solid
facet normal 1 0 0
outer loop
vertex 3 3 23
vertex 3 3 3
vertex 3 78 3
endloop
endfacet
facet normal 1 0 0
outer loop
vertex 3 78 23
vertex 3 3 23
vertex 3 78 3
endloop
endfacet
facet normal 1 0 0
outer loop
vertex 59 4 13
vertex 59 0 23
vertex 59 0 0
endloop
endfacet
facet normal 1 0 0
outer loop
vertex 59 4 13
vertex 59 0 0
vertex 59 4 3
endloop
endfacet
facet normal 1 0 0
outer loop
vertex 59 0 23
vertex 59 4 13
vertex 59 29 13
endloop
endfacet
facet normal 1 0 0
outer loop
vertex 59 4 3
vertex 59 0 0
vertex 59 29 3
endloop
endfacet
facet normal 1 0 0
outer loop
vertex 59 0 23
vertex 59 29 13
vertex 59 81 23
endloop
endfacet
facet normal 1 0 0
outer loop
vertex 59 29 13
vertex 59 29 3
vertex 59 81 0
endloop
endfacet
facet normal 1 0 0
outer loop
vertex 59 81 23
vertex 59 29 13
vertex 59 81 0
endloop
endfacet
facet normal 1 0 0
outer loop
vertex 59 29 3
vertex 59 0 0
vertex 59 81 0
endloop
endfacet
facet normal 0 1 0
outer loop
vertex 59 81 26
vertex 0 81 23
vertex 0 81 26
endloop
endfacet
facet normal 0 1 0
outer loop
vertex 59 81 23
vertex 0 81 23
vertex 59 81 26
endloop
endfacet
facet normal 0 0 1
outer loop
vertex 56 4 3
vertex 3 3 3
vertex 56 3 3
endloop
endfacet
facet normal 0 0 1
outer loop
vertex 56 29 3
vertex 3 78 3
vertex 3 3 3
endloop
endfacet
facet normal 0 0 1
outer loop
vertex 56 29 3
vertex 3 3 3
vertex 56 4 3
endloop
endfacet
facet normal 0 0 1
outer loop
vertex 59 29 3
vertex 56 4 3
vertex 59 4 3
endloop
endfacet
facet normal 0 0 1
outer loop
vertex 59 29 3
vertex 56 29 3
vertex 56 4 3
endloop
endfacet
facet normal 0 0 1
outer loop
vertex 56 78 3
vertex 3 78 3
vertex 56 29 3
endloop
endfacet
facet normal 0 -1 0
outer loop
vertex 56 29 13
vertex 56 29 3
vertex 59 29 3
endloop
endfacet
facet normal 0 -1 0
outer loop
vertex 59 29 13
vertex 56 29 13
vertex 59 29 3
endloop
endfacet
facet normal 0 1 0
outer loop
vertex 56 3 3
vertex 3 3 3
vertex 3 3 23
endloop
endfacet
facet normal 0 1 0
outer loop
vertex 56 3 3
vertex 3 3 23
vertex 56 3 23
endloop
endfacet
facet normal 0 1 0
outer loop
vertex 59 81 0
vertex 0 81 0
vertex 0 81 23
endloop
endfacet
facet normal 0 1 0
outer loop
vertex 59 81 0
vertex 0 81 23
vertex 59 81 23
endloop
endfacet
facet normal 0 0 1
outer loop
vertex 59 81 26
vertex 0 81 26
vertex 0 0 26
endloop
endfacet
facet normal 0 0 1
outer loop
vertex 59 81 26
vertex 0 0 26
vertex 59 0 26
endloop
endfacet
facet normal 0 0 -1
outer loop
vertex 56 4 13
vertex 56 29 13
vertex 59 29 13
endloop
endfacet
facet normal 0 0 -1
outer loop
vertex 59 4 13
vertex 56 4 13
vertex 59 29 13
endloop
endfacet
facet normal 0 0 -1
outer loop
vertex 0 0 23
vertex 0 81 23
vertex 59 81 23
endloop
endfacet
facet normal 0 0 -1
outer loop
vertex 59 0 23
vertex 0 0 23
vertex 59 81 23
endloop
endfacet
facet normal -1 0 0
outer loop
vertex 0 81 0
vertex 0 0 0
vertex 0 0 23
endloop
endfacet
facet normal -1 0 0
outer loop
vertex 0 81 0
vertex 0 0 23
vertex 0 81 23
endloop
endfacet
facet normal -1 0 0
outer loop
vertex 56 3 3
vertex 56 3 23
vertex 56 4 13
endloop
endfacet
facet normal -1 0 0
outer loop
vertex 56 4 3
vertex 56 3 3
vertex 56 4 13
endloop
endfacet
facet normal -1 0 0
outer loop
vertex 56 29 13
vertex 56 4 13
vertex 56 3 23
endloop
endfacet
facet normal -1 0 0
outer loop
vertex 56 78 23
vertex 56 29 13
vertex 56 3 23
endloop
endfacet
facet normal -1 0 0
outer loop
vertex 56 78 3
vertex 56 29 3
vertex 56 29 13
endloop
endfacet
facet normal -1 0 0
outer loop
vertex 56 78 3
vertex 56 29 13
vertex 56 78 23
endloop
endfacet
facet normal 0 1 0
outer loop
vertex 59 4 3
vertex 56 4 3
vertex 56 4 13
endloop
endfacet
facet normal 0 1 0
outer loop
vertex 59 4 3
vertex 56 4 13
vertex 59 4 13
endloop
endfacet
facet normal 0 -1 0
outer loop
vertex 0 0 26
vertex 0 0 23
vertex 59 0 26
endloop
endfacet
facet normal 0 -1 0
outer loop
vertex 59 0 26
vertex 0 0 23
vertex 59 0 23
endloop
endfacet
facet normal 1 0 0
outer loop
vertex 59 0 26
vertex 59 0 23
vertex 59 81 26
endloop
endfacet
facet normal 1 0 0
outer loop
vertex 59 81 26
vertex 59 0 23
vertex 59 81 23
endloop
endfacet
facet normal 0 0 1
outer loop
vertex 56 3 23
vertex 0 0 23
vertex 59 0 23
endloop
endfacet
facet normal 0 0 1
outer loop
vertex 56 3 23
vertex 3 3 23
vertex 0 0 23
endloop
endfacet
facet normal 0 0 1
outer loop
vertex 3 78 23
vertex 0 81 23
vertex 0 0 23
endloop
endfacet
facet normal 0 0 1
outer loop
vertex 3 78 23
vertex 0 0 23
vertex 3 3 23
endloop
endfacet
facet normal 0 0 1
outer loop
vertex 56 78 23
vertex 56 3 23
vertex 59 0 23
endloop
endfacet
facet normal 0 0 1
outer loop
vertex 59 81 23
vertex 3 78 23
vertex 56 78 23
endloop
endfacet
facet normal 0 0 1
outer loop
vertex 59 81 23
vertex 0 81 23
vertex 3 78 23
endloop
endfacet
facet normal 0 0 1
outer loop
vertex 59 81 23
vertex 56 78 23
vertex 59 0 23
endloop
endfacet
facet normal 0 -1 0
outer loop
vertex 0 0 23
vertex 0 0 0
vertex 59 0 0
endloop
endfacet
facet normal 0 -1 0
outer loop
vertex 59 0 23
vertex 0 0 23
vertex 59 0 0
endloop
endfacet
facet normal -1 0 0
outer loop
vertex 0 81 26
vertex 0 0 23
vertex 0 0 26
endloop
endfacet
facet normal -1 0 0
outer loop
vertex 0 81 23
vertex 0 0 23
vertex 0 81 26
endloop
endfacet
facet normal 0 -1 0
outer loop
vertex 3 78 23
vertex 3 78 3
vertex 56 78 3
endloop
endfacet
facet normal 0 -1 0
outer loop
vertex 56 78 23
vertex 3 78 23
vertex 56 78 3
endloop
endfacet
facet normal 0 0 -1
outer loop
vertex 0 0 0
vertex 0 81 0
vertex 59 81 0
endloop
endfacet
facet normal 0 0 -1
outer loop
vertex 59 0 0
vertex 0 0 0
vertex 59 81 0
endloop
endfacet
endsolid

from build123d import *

# Parameters (mm, degrees)
BOX003_W     = 3
BOX003_H     = 25
BOX003_DEPTH = 10
BOX002_W     = 59
BOX002_H     = 81
BOX002_DEPTH = 3
BOX001_W     = 53
BOX001_H     = 75
BOX001_DEPTH = 20
BOX_W        = 59
BOX_H        = 81
BOX_DEPTH    = 20
BOX004_W     = 59
BOX004_H     = 81
BOX004_DEPTH = 3


with BuildPart() as box003:
    # Box003 → Box003 (new body)
    with BuildSketch(Plane(origin=(56, 4, 3), x_dir=(1, 0, 0), z_dir=(0, 0, 1))):
        with Locations((1.5, 12.5)):
            Rectangle(BOX003_W, BOX003_H)
    extrude(amount=BOX003_DEPTH)


with BuildPart() as box002:
    # Box002 → Box002 (new body)
    with BuildSketch(Plane.XY):
        with Locations((29.5, 40.5)):
            Rectangle(BOX002_W, BOX002_H)
    extrude(amount=BOX002_DEPTH)


with BuildPart() as box001:
    # Box001 → Box001 (new body)
    with BuildSketch(Plane(origin=(3, 3, 0), x_dir=(1, 0, 0), z_dir=(0, 0, 1))):
        with Locations((26.5, 37.5)):
            Rectangle(BOX001_W, BOX001_H)
    extrude(amount=BOX001_DEPTH)


with BuildPart() as caja:
    # Box → Box (new body)
    with BuildSketch(Plane.XY):
        with Locations((29.5, 40.5)):
            Rectangle(BOX_W, BOX_H)
    extrude(amount=BOX_DEPTH)

    # Cut: cut Box001
    add(box001.part, mode=Mode.SUBTRACT)


with BuildPart() as caja_1:
    # Cut placement: moved
    add(caja.part.moved(Location((0, 0, 3))))

    # Fusion: union Box002
    add(box002.part)

    # Cut001: cut Box003
    add(box003.part, mode=Mode.SUBTRACT)


with BuildPart() as tapa:
    # Box004 → Box004 (new body)
    with BuildSketch(Plane.XY.offset(23)):
        with Locations((29.5, 40.5)):
            Rectangle(BOX004_W, BOX004_H)
    extrude(amount=BOX004_DEPTH)


solid = Compound([caja_1.part, tapa.part])
